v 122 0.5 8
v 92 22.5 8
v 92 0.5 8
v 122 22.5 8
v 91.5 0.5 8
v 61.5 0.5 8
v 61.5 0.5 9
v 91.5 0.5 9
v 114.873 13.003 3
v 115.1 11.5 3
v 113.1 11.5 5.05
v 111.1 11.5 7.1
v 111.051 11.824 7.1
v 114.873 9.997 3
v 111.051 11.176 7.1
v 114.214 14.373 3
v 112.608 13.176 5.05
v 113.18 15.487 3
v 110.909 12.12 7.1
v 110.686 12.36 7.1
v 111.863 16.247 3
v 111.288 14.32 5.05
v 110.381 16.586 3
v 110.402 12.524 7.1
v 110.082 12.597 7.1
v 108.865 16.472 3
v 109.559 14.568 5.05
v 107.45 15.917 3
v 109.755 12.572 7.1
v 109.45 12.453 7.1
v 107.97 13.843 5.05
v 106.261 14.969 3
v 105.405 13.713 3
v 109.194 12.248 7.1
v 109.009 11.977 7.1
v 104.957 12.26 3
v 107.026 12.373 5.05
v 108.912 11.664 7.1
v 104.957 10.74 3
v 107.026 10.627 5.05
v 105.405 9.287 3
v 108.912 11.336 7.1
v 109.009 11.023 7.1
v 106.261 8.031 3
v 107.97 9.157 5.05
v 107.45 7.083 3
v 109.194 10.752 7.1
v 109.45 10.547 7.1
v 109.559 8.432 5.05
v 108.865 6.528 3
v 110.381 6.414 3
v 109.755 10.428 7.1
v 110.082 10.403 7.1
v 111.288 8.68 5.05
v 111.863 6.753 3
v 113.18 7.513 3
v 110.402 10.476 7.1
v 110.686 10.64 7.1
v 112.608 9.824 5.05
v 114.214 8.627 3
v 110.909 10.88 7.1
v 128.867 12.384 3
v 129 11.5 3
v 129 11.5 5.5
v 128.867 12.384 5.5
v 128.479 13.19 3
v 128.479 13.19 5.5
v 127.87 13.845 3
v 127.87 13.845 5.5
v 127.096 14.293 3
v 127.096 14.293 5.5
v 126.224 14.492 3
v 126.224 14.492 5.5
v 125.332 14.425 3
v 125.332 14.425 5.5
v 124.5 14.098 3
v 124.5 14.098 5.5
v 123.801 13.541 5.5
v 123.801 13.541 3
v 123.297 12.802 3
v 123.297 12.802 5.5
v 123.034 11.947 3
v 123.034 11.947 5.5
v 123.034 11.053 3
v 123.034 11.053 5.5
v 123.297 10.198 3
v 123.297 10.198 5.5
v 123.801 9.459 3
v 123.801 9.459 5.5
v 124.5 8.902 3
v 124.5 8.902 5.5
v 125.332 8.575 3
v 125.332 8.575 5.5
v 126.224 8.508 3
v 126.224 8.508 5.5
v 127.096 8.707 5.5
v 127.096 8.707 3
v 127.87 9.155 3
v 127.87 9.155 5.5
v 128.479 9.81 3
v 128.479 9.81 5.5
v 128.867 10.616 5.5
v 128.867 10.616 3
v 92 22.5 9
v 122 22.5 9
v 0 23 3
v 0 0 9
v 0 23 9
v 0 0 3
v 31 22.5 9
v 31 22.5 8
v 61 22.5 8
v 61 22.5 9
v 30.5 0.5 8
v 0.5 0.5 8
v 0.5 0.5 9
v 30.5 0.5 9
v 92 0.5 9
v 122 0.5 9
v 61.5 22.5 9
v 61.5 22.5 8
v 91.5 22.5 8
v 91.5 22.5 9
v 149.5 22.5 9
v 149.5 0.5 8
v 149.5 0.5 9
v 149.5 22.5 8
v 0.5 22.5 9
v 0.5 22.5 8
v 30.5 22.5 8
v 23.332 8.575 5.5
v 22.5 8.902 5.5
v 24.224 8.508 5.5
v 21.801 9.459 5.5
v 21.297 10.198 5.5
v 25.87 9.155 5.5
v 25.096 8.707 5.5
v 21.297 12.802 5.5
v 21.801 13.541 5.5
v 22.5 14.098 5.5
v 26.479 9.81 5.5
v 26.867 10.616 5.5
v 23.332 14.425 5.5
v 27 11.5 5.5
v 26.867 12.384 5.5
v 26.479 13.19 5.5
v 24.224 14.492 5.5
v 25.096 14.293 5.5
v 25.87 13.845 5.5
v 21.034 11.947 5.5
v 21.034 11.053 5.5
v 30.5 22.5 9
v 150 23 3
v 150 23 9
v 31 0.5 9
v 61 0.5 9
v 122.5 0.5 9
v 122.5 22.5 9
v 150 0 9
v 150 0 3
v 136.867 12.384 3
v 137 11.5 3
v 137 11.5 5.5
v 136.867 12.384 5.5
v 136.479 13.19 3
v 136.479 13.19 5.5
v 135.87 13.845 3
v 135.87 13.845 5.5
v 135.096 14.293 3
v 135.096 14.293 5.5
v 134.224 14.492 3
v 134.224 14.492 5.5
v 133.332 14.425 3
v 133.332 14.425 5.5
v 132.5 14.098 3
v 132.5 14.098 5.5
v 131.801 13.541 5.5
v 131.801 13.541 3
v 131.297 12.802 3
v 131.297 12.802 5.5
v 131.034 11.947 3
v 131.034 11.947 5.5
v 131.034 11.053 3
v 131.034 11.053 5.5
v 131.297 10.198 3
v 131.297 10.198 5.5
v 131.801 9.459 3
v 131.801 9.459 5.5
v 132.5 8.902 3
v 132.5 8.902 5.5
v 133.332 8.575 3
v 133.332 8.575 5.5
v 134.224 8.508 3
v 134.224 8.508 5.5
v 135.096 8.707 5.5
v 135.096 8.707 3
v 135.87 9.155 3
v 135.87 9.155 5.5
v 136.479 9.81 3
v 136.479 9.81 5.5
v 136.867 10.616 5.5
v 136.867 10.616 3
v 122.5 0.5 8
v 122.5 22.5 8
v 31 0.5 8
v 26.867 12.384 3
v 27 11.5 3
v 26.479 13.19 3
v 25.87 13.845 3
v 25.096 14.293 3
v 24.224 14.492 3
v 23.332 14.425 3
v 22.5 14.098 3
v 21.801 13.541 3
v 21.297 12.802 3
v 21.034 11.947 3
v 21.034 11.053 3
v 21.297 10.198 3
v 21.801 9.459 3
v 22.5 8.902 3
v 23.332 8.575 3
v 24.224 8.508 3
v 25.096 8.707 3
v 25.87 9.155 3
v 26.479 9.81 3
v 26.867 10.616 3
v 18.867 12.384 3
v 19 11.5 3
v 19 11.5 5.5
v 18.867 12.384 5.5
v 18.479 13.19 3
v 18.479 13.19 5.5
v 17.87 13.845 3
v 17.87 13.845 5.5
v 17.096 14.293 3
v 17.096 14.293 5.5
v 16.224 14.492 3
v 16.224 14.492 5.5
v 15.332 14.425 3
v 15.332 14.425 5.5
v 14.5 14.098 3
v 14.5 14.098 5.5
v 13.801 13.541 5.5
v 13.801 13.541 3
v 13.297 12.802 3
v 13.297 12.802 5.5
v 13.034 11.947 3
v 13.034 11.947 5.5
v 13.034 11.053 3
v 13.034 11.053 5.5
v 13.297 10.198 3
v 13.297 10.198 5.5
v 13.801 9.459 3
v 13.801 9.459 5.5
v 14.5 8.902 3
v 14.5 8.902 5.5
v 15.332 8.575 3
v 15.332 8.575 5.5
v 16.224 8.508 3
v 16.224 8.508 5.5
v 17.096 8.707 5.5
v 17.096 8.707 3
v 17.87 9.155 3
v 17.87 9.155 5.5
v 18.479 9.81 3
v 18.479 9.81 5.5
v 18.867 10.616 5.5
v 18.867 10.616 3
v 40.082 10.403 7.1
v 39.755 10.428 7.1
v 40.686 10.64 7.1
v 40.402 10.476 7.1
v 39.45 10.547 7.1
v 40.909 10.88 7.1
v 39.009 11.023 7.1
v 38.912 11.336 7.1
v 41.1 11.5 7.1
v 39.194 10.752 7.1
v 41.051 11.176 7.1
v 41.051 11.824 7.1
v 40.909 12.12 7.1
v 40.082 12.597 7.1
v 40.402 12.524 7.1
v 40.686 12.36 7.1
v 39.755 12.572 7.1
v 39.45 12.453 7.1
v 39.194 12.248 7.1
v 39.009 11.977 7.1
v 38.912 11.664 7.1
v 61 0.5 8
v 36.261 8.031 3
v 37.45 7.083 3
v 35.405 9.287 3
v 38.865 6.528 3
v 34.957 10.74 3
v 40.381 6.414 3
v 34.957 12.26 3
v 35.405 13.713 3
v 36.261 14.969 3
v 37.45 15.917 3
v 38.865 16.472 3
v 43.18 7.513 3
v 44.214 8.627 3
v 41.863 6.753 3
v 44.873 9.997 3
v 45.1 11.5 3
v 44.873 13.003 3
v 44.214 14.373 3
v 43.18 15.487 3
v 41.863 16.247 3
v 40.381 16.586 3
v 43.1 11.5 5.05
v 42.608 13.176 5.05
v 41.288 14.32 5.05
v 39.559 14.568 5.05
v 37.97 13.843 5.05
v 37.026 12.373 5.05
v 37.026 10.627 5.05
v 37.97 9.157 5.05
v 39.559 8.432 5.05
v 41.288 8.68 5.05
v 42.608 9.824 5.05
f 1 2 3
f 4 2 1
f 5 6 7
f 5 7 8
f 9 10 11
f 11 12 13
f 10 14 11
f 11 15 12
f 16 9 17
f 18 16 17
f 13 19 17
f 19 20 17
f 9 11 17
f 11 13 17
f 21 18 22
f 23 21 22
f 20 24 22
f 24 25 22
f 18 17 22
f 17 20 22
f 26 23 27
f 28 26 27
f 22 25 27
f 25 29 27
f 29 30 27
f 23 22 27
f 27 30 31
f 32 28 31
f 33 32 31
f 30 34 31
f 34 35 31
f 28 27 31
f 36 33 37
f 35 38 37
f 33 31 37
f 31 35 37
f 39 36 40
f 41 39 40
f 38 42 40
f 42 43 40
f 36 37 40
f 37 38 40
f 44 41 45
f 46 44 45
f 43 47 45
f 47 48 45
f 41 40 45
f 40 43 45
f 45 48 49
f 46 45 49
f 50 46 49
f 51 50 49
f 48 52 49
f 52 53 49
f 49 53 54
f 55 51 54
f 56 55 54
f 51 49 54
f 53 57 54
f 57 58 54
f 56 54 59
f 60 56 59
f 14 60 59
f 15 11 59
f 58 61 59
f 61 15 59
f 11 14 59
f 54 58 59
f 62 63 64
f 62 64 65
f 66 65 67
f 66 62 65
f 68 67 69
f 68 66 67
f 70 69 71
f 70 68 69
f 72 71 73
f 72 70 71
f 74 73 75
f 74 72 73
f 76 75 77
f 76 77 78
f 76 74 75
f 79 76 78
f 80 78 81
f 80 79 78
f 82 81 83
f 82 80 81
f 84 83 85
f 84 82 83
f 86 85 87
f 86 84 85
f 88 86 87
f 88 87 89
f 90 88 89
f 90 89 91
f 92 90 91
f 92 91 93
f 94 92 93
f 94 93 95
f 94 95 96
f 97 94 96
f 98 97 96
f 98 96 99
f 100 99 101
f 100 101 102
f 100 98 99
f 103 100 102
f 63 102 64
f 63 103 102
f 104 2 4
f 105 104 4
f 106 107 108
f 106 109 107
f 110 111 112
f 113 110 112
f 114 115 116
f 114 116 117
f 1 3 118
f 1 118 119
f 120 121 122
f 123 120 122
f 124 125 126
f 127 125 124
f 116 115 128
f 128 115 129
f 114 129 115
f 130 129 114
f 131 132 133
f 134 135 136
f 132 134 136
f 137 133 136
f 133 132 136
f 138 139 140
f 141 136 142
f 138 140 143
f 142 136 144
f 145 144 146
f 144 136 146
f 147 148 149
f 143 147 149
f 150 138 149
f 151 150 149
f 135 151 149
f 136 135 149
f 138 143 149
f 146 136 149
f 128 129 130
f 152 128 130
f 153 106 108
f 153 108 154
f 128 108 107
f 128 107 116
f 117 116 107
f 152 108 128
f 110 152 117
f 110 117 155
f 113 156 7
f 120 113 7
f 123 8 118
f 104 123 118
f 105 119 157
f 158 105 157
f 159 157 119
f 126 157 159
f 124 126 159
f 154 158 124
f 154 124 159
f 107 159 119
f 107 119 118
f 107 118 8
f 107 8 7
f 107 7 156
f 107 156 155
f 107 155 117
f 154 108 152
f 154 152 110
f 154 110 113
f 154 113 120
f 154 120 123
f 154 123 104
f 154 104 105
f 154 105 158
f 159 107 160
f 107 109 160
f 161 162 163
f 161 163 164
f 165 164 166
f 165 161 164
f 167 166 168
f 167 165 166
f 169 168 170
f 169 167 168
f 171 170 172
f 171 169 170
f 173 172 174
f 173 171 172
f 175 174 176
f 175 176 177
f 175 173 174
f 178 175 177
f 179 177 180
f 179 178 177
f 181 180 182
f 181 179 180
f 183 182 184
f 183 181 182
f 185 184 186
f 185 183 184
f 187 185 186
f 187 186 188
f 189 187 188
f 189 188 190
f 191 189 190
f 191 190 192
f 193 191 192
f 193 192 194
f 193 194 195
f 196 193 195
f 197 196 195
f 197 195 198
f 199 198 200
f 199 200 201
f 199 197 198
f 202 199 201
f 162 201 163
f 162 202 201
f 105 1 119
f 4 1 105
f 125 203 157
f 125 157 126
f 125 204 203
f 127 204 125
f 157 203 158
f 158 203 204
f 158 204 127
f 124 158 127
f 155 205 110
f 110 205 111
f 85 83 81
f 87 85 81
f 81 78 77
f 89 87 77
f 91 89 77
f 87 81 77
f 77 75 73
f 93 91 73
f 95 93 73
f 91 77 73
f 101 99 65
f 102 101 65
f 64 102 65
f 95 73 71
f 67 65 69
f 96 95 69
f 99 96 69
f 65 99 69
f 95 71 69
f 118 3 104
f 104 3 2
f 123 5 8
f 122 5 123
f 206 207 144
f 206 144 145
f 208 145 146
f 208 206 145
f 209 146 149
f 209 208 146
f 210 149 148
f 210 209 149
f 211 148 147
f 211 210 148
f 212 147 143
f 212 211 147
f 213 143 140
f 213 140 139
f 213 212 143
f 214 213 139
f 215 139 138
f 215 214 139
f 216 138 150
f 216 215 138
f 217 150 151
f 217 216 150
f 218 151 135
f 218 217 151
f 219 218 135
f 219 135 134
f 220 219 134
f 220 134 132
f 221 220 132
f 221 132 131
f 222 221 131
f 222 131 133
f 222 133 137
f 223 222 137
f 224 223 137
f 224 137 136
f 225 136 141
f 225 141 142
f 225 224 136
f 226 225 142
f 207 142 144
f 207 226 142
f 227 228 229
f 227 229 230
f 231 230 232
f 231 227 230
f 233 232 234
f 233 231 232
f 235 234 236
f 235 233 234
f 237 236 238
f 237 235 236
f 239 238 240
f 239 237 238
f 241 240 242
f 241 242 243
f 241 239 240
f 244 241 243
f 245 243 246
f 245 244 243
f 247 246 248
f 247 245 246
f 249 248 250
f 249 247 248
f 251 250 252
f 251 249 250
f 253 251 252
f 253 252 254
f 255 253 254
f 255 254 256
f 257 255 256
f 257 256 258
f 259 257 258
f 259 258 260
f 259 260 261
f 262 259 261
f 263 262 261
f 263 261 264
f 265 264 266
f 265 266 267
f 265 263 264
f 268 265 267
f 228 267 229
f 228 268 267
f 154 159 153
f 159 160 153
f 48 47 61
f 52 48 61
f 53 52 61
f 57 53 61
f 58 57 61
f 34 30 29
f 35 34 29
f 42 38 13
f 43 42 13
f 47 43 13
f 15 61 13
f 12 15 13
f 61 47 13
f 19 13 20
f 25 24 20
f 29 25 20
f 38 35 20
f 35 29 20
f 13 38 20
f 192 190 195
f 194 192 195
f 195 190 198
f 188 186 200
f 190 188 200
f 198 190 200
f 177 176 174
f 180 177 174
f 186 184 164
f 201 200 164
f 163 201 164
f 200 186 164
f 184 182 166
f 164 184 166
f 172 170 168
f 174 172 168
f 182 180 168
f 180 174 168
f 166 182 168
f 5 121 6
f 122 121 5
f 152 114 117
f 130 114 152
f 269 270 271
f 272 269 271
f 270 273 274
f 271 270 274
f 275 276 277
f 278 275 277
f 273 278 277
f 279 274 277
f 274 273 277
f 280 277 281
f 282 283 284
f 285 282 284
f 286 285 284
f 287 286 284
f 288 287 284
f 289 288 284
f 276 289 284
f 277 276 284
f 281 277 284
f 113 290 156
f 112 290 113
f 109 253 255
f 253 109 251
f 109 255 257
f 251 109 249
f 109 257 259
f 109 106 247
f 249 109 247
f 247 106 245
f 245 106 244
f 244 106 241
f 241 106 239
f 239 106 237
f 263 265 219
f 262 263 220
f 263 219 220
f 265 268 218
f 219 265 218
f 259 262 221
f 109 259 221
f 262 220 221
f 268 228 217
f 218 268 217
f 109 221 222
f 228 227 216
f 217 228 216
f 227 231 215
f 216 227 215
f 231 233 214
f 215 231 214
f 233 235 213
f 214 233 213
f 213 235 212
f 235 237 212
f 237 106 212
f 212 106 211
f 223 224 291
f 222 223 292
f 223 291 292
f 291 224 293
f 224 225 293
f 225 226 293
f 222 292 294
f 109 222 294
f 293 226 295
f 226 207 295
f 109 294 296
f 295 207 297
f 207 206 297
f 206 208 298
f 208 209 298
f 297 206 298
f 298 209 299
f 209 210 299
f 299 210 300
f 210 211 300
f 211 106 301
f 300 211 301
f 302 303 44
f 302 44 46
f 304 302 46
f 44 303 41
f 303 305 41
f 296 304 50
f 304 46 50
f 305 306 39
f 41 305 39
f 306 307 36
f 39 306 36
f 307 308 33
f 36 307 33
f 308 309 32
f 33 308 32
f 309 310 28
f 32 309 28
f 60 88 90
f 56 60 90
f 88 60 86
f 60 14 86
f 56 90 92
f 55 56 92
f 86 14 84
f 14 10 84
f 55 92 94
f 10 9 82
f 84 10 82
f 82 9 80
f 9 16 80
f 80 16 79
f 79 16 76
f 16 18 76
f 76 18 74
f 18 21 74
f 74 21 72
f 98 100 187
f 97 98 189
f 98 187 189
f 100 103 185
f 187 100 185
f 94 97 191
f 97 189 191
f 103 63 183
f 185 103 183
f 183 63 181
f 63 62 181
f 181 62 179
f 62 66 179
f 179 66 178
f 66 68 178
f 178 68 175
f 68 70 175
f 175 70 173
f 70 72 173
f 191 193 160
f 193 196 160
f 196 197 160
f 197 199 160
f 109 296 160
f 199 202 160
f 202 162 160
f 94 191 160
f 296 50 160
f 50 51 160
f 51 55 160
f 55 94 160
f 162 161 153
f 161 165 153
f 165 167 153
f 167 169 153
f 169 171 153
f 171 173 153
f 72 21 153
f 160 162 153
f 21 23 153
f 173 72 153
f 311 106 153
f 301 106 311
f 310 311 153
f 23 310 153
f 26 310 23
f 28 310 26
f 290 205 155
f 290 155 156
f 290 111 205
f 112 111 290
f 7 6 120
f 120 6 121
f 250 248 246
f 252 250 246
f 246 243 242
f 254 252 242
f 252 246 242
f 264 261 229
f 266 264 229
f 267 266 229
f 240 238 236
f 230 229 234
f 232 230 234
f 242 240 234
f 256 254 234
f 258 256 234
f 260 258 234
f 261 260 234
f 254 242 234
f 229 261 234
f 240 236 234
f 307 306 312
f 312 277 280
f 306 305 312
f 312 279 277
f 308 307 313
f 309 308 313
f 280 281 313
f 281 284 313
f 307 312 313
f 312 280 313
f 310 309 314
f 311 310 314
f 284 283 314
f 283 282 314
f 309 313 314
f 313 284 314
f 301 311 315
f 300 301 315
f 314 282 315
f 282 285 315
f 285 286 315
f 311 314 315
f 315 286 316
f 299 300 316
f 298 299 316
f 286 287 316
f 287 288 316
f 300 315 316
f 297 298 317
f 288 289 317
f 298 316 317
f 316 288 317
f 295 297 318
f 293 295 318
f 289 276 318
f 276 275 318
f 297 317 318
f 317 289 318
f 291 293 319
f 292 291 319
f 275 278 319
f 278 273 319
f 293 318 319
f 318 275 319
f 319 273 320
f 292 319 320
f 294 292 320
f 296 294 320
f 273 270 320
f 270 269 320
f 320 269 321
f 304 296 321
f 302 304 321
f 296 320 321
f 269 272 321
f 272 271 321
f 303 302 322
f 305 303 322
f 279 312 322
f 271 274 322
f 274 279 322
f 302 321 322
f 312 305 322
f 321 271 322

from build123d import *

# Parameters (mm, degrees)
BOX029_W          = 30
BOX029_H          = 22
BOX029_DEPTH      = 1.5
BOX030_W          = 27
BOX030_H          = 22
BOX030_DEPTH      = 1.5
BOX028_W          = 30
BOX028_H          = 22
BOX028_DEPTH      = 1.5
BOX027_W          = 30
BOX027_H          = 22
BOX027_DEPTH      = 1.5
BOX026_W          = 30
BOX026_H          = 22
BOX026_DEPTH      = 1.5
BOX025_W          = 150
BOX025_H          = 23
BOX025_DEPTH      = 1
CYLINDER006_R     = 3
CYLINDER006_DEPTH = 2.5
CYLINDER005_R     = 3
CYLINDER005_DEPTH = 2.5
CYLINDER007_R     = 3
CYLINDER007_DEPTH = 2.5
CYLINDER004_R     = 3
CYLINDER004_DEPTH = 2.5
BOX001_W          = 150
BOX001_H          = 23
BOX001_DEPTH      = 5


with BuildPart() as cube007:
    # Box029 → Box029 (new body)
    with BuildSketch(Plane(origin=(92, 0.5, 8), x_dir=(1, 0, 0), z_dir=(0, 0, 1))):
        with Locations((15, 11)):
            Rectangle(BOX029_W, BOX029_H)
    extrude(amount=BOX029_DEPTH)


with BuildPart() as cube008:
    # Box030 → Box030 (new body)
    with BuildSketch(Plane(origin=(122.5, 0.5, 8), x_dir=(1, 0, 0), z_dir=(0, 0, 1))):
        with Locations((13.5, 11)):
            Rectangle(BOX030_W, BOX030_H)
    extrude(amount=BOX030_DEPTH)


with BuildPart() as cube006:
    # Box028 → Box028 (new body)
    with BuildSketch(Plane(origin=(61.5, 0.5, 8), x_dir=(1, 0, 0), z_dir=(0, 0, 1))):
        with Locations((15, 11)):
            Rectangle(BOX028_W, BOX028_H)
    extrude(amount=BOX028_DEPTH)


with BuildPart() as cube005:
    # Box027 → Box027 (new body)
    with BuildSketch(Plane(origin=(31, 0.5, 8), x_dir=(1, 0, 0), z_dir=(0, 0, 1))):
        with Locations((15, 11)):
            Rectangle(BOX027_W, BOX027_H)
    extrude(amount=BOX027_DEPTH)


with BuildPart() as remove_holes:
    # Box026 → Box026 (new body)
    with BuildSketch(Plane(origin=(0.5, 0.5, 8), x_dir=(1, 0, 0), z_dir=(0, 0, 1))):
        with Locations((15, 11)):
            Rectangle(BOX026_W, BOX026_H)
    extrude(amount=BOX026_DEPTH)

    # Fusion027: union Cube007, Cube008, Cube006, Cube005
    add(cube007.part)
    add(cube008.part)
    add(cube006.part)
    add(cube005.part)


with BuildPart() as f_5x_loose:
    # Box025 → Box025 (new body)
    with BuildSketch(Plane.XY.offset(8)):
        with Locations((75, 11.5)):
            Rectangle(BOX025_W, BOX025_H)
    extrude(amount=BOX025_DEPTH)

    # Cut010: cut remove_holes
    add(remove_holes.part, mode=Mode.SUBTRACT)


with BuildPart() as cone002:
    # Cone002 → Cone002 (revolve)
    with BuildSketch(Plane(origin=(40, 11.5, 3), x_dir=(1, 0, 0), z_dir=(0, -1, 0))):
        Polygon((0, 0), (5.1, 0), (1.1, 4.1), (0, 4.1), align=None)
    revolve(axis=Axis((40, 11.5, 3), (0, 0, 1)))


with BuildPart() as cone003:
    # Cone003 → Cone003 (revolve)
    with BuildSketch(Plane(origin=(110, 11.5, 3), x_dir=(1, 0, 0), z_dir=(0, -1, 0))):
        Polygon((0, 0), (5.1, 0), (1.1, 4.1), (0, 4.1), align=None)
    revolve(axis=Axis((110, 11.5, 3), (0, 0, 1)))


with BuildPart() as cylinder006:
    # Cylinder006 → Cylinder006 (new body)
    with BuildSketch(Plane(origin=(24, 11.5, 3), x_dir=(1, 0, 0), z_dir=(0, 0, 1))):
        Circle(CYLINDER006_R)
    extrude(amount=CYLINDER006_DEPTH)


with BuildPart() as cylinder005:
    # Cylinder005 → Cylinder005 (new body)
    with BuildSketch(Plane(origin=(126, 11.5, 3), x_dir=(1, 0, 0), z_dir=(0, 0, 1))):
        Circle(CYLINDER005_R)
    extrude(amount=CYLINDER005_DEPTH)


with BuildPart() as cylinder007:
    # Cylinder007 → Cylinder007 (new body)
    with BuildSketch(Plane(origin=(134, 11.5, 3), x_dir=(1, 0, 0), z_dir=(0, 0, 1))):
        Circle(CYLINDER007_R)
    extrude(amount=CYLINDER007_DEPTH)


with BuildPart() as removals:
    # Cylinder004 → Cylinder004 (new body)
    with BuildSketch(Plane(origin=(16, 11.5, 3), x_dir=(1, 0, 0), z_dir=(0, 0, 1))):
        Circle(CYLINDER004_R)
    extrude(amount=CYLINDER004_DEPTH)

    # Fusion002: union Cone002, Cone003, Cylinder006, Cylinder005, Cylinder007
    add(cone002.part)
    add(cone003.part)
    add(cylinder006.part)
    add(cylinder005.part)
    add(cylinder007.part)


with BuildPart() as top_5x_loose:
    # Box001 → Box001 (new body)
    with BuildSketch(Plane.XY.offset(3)):
        with Locations((75, 11.5)):
            Rectangle(BOX001_W, BOX001_H)
    extrude(amount=BOX001_DEPTH)

    # Cut009: cut removals
    add(removals.part, mode=Mode.SUBTRACT)

    # Fusion028: union 5x_loose
    add(f_5x_loose.part)


solid = top_5x_loose.part
